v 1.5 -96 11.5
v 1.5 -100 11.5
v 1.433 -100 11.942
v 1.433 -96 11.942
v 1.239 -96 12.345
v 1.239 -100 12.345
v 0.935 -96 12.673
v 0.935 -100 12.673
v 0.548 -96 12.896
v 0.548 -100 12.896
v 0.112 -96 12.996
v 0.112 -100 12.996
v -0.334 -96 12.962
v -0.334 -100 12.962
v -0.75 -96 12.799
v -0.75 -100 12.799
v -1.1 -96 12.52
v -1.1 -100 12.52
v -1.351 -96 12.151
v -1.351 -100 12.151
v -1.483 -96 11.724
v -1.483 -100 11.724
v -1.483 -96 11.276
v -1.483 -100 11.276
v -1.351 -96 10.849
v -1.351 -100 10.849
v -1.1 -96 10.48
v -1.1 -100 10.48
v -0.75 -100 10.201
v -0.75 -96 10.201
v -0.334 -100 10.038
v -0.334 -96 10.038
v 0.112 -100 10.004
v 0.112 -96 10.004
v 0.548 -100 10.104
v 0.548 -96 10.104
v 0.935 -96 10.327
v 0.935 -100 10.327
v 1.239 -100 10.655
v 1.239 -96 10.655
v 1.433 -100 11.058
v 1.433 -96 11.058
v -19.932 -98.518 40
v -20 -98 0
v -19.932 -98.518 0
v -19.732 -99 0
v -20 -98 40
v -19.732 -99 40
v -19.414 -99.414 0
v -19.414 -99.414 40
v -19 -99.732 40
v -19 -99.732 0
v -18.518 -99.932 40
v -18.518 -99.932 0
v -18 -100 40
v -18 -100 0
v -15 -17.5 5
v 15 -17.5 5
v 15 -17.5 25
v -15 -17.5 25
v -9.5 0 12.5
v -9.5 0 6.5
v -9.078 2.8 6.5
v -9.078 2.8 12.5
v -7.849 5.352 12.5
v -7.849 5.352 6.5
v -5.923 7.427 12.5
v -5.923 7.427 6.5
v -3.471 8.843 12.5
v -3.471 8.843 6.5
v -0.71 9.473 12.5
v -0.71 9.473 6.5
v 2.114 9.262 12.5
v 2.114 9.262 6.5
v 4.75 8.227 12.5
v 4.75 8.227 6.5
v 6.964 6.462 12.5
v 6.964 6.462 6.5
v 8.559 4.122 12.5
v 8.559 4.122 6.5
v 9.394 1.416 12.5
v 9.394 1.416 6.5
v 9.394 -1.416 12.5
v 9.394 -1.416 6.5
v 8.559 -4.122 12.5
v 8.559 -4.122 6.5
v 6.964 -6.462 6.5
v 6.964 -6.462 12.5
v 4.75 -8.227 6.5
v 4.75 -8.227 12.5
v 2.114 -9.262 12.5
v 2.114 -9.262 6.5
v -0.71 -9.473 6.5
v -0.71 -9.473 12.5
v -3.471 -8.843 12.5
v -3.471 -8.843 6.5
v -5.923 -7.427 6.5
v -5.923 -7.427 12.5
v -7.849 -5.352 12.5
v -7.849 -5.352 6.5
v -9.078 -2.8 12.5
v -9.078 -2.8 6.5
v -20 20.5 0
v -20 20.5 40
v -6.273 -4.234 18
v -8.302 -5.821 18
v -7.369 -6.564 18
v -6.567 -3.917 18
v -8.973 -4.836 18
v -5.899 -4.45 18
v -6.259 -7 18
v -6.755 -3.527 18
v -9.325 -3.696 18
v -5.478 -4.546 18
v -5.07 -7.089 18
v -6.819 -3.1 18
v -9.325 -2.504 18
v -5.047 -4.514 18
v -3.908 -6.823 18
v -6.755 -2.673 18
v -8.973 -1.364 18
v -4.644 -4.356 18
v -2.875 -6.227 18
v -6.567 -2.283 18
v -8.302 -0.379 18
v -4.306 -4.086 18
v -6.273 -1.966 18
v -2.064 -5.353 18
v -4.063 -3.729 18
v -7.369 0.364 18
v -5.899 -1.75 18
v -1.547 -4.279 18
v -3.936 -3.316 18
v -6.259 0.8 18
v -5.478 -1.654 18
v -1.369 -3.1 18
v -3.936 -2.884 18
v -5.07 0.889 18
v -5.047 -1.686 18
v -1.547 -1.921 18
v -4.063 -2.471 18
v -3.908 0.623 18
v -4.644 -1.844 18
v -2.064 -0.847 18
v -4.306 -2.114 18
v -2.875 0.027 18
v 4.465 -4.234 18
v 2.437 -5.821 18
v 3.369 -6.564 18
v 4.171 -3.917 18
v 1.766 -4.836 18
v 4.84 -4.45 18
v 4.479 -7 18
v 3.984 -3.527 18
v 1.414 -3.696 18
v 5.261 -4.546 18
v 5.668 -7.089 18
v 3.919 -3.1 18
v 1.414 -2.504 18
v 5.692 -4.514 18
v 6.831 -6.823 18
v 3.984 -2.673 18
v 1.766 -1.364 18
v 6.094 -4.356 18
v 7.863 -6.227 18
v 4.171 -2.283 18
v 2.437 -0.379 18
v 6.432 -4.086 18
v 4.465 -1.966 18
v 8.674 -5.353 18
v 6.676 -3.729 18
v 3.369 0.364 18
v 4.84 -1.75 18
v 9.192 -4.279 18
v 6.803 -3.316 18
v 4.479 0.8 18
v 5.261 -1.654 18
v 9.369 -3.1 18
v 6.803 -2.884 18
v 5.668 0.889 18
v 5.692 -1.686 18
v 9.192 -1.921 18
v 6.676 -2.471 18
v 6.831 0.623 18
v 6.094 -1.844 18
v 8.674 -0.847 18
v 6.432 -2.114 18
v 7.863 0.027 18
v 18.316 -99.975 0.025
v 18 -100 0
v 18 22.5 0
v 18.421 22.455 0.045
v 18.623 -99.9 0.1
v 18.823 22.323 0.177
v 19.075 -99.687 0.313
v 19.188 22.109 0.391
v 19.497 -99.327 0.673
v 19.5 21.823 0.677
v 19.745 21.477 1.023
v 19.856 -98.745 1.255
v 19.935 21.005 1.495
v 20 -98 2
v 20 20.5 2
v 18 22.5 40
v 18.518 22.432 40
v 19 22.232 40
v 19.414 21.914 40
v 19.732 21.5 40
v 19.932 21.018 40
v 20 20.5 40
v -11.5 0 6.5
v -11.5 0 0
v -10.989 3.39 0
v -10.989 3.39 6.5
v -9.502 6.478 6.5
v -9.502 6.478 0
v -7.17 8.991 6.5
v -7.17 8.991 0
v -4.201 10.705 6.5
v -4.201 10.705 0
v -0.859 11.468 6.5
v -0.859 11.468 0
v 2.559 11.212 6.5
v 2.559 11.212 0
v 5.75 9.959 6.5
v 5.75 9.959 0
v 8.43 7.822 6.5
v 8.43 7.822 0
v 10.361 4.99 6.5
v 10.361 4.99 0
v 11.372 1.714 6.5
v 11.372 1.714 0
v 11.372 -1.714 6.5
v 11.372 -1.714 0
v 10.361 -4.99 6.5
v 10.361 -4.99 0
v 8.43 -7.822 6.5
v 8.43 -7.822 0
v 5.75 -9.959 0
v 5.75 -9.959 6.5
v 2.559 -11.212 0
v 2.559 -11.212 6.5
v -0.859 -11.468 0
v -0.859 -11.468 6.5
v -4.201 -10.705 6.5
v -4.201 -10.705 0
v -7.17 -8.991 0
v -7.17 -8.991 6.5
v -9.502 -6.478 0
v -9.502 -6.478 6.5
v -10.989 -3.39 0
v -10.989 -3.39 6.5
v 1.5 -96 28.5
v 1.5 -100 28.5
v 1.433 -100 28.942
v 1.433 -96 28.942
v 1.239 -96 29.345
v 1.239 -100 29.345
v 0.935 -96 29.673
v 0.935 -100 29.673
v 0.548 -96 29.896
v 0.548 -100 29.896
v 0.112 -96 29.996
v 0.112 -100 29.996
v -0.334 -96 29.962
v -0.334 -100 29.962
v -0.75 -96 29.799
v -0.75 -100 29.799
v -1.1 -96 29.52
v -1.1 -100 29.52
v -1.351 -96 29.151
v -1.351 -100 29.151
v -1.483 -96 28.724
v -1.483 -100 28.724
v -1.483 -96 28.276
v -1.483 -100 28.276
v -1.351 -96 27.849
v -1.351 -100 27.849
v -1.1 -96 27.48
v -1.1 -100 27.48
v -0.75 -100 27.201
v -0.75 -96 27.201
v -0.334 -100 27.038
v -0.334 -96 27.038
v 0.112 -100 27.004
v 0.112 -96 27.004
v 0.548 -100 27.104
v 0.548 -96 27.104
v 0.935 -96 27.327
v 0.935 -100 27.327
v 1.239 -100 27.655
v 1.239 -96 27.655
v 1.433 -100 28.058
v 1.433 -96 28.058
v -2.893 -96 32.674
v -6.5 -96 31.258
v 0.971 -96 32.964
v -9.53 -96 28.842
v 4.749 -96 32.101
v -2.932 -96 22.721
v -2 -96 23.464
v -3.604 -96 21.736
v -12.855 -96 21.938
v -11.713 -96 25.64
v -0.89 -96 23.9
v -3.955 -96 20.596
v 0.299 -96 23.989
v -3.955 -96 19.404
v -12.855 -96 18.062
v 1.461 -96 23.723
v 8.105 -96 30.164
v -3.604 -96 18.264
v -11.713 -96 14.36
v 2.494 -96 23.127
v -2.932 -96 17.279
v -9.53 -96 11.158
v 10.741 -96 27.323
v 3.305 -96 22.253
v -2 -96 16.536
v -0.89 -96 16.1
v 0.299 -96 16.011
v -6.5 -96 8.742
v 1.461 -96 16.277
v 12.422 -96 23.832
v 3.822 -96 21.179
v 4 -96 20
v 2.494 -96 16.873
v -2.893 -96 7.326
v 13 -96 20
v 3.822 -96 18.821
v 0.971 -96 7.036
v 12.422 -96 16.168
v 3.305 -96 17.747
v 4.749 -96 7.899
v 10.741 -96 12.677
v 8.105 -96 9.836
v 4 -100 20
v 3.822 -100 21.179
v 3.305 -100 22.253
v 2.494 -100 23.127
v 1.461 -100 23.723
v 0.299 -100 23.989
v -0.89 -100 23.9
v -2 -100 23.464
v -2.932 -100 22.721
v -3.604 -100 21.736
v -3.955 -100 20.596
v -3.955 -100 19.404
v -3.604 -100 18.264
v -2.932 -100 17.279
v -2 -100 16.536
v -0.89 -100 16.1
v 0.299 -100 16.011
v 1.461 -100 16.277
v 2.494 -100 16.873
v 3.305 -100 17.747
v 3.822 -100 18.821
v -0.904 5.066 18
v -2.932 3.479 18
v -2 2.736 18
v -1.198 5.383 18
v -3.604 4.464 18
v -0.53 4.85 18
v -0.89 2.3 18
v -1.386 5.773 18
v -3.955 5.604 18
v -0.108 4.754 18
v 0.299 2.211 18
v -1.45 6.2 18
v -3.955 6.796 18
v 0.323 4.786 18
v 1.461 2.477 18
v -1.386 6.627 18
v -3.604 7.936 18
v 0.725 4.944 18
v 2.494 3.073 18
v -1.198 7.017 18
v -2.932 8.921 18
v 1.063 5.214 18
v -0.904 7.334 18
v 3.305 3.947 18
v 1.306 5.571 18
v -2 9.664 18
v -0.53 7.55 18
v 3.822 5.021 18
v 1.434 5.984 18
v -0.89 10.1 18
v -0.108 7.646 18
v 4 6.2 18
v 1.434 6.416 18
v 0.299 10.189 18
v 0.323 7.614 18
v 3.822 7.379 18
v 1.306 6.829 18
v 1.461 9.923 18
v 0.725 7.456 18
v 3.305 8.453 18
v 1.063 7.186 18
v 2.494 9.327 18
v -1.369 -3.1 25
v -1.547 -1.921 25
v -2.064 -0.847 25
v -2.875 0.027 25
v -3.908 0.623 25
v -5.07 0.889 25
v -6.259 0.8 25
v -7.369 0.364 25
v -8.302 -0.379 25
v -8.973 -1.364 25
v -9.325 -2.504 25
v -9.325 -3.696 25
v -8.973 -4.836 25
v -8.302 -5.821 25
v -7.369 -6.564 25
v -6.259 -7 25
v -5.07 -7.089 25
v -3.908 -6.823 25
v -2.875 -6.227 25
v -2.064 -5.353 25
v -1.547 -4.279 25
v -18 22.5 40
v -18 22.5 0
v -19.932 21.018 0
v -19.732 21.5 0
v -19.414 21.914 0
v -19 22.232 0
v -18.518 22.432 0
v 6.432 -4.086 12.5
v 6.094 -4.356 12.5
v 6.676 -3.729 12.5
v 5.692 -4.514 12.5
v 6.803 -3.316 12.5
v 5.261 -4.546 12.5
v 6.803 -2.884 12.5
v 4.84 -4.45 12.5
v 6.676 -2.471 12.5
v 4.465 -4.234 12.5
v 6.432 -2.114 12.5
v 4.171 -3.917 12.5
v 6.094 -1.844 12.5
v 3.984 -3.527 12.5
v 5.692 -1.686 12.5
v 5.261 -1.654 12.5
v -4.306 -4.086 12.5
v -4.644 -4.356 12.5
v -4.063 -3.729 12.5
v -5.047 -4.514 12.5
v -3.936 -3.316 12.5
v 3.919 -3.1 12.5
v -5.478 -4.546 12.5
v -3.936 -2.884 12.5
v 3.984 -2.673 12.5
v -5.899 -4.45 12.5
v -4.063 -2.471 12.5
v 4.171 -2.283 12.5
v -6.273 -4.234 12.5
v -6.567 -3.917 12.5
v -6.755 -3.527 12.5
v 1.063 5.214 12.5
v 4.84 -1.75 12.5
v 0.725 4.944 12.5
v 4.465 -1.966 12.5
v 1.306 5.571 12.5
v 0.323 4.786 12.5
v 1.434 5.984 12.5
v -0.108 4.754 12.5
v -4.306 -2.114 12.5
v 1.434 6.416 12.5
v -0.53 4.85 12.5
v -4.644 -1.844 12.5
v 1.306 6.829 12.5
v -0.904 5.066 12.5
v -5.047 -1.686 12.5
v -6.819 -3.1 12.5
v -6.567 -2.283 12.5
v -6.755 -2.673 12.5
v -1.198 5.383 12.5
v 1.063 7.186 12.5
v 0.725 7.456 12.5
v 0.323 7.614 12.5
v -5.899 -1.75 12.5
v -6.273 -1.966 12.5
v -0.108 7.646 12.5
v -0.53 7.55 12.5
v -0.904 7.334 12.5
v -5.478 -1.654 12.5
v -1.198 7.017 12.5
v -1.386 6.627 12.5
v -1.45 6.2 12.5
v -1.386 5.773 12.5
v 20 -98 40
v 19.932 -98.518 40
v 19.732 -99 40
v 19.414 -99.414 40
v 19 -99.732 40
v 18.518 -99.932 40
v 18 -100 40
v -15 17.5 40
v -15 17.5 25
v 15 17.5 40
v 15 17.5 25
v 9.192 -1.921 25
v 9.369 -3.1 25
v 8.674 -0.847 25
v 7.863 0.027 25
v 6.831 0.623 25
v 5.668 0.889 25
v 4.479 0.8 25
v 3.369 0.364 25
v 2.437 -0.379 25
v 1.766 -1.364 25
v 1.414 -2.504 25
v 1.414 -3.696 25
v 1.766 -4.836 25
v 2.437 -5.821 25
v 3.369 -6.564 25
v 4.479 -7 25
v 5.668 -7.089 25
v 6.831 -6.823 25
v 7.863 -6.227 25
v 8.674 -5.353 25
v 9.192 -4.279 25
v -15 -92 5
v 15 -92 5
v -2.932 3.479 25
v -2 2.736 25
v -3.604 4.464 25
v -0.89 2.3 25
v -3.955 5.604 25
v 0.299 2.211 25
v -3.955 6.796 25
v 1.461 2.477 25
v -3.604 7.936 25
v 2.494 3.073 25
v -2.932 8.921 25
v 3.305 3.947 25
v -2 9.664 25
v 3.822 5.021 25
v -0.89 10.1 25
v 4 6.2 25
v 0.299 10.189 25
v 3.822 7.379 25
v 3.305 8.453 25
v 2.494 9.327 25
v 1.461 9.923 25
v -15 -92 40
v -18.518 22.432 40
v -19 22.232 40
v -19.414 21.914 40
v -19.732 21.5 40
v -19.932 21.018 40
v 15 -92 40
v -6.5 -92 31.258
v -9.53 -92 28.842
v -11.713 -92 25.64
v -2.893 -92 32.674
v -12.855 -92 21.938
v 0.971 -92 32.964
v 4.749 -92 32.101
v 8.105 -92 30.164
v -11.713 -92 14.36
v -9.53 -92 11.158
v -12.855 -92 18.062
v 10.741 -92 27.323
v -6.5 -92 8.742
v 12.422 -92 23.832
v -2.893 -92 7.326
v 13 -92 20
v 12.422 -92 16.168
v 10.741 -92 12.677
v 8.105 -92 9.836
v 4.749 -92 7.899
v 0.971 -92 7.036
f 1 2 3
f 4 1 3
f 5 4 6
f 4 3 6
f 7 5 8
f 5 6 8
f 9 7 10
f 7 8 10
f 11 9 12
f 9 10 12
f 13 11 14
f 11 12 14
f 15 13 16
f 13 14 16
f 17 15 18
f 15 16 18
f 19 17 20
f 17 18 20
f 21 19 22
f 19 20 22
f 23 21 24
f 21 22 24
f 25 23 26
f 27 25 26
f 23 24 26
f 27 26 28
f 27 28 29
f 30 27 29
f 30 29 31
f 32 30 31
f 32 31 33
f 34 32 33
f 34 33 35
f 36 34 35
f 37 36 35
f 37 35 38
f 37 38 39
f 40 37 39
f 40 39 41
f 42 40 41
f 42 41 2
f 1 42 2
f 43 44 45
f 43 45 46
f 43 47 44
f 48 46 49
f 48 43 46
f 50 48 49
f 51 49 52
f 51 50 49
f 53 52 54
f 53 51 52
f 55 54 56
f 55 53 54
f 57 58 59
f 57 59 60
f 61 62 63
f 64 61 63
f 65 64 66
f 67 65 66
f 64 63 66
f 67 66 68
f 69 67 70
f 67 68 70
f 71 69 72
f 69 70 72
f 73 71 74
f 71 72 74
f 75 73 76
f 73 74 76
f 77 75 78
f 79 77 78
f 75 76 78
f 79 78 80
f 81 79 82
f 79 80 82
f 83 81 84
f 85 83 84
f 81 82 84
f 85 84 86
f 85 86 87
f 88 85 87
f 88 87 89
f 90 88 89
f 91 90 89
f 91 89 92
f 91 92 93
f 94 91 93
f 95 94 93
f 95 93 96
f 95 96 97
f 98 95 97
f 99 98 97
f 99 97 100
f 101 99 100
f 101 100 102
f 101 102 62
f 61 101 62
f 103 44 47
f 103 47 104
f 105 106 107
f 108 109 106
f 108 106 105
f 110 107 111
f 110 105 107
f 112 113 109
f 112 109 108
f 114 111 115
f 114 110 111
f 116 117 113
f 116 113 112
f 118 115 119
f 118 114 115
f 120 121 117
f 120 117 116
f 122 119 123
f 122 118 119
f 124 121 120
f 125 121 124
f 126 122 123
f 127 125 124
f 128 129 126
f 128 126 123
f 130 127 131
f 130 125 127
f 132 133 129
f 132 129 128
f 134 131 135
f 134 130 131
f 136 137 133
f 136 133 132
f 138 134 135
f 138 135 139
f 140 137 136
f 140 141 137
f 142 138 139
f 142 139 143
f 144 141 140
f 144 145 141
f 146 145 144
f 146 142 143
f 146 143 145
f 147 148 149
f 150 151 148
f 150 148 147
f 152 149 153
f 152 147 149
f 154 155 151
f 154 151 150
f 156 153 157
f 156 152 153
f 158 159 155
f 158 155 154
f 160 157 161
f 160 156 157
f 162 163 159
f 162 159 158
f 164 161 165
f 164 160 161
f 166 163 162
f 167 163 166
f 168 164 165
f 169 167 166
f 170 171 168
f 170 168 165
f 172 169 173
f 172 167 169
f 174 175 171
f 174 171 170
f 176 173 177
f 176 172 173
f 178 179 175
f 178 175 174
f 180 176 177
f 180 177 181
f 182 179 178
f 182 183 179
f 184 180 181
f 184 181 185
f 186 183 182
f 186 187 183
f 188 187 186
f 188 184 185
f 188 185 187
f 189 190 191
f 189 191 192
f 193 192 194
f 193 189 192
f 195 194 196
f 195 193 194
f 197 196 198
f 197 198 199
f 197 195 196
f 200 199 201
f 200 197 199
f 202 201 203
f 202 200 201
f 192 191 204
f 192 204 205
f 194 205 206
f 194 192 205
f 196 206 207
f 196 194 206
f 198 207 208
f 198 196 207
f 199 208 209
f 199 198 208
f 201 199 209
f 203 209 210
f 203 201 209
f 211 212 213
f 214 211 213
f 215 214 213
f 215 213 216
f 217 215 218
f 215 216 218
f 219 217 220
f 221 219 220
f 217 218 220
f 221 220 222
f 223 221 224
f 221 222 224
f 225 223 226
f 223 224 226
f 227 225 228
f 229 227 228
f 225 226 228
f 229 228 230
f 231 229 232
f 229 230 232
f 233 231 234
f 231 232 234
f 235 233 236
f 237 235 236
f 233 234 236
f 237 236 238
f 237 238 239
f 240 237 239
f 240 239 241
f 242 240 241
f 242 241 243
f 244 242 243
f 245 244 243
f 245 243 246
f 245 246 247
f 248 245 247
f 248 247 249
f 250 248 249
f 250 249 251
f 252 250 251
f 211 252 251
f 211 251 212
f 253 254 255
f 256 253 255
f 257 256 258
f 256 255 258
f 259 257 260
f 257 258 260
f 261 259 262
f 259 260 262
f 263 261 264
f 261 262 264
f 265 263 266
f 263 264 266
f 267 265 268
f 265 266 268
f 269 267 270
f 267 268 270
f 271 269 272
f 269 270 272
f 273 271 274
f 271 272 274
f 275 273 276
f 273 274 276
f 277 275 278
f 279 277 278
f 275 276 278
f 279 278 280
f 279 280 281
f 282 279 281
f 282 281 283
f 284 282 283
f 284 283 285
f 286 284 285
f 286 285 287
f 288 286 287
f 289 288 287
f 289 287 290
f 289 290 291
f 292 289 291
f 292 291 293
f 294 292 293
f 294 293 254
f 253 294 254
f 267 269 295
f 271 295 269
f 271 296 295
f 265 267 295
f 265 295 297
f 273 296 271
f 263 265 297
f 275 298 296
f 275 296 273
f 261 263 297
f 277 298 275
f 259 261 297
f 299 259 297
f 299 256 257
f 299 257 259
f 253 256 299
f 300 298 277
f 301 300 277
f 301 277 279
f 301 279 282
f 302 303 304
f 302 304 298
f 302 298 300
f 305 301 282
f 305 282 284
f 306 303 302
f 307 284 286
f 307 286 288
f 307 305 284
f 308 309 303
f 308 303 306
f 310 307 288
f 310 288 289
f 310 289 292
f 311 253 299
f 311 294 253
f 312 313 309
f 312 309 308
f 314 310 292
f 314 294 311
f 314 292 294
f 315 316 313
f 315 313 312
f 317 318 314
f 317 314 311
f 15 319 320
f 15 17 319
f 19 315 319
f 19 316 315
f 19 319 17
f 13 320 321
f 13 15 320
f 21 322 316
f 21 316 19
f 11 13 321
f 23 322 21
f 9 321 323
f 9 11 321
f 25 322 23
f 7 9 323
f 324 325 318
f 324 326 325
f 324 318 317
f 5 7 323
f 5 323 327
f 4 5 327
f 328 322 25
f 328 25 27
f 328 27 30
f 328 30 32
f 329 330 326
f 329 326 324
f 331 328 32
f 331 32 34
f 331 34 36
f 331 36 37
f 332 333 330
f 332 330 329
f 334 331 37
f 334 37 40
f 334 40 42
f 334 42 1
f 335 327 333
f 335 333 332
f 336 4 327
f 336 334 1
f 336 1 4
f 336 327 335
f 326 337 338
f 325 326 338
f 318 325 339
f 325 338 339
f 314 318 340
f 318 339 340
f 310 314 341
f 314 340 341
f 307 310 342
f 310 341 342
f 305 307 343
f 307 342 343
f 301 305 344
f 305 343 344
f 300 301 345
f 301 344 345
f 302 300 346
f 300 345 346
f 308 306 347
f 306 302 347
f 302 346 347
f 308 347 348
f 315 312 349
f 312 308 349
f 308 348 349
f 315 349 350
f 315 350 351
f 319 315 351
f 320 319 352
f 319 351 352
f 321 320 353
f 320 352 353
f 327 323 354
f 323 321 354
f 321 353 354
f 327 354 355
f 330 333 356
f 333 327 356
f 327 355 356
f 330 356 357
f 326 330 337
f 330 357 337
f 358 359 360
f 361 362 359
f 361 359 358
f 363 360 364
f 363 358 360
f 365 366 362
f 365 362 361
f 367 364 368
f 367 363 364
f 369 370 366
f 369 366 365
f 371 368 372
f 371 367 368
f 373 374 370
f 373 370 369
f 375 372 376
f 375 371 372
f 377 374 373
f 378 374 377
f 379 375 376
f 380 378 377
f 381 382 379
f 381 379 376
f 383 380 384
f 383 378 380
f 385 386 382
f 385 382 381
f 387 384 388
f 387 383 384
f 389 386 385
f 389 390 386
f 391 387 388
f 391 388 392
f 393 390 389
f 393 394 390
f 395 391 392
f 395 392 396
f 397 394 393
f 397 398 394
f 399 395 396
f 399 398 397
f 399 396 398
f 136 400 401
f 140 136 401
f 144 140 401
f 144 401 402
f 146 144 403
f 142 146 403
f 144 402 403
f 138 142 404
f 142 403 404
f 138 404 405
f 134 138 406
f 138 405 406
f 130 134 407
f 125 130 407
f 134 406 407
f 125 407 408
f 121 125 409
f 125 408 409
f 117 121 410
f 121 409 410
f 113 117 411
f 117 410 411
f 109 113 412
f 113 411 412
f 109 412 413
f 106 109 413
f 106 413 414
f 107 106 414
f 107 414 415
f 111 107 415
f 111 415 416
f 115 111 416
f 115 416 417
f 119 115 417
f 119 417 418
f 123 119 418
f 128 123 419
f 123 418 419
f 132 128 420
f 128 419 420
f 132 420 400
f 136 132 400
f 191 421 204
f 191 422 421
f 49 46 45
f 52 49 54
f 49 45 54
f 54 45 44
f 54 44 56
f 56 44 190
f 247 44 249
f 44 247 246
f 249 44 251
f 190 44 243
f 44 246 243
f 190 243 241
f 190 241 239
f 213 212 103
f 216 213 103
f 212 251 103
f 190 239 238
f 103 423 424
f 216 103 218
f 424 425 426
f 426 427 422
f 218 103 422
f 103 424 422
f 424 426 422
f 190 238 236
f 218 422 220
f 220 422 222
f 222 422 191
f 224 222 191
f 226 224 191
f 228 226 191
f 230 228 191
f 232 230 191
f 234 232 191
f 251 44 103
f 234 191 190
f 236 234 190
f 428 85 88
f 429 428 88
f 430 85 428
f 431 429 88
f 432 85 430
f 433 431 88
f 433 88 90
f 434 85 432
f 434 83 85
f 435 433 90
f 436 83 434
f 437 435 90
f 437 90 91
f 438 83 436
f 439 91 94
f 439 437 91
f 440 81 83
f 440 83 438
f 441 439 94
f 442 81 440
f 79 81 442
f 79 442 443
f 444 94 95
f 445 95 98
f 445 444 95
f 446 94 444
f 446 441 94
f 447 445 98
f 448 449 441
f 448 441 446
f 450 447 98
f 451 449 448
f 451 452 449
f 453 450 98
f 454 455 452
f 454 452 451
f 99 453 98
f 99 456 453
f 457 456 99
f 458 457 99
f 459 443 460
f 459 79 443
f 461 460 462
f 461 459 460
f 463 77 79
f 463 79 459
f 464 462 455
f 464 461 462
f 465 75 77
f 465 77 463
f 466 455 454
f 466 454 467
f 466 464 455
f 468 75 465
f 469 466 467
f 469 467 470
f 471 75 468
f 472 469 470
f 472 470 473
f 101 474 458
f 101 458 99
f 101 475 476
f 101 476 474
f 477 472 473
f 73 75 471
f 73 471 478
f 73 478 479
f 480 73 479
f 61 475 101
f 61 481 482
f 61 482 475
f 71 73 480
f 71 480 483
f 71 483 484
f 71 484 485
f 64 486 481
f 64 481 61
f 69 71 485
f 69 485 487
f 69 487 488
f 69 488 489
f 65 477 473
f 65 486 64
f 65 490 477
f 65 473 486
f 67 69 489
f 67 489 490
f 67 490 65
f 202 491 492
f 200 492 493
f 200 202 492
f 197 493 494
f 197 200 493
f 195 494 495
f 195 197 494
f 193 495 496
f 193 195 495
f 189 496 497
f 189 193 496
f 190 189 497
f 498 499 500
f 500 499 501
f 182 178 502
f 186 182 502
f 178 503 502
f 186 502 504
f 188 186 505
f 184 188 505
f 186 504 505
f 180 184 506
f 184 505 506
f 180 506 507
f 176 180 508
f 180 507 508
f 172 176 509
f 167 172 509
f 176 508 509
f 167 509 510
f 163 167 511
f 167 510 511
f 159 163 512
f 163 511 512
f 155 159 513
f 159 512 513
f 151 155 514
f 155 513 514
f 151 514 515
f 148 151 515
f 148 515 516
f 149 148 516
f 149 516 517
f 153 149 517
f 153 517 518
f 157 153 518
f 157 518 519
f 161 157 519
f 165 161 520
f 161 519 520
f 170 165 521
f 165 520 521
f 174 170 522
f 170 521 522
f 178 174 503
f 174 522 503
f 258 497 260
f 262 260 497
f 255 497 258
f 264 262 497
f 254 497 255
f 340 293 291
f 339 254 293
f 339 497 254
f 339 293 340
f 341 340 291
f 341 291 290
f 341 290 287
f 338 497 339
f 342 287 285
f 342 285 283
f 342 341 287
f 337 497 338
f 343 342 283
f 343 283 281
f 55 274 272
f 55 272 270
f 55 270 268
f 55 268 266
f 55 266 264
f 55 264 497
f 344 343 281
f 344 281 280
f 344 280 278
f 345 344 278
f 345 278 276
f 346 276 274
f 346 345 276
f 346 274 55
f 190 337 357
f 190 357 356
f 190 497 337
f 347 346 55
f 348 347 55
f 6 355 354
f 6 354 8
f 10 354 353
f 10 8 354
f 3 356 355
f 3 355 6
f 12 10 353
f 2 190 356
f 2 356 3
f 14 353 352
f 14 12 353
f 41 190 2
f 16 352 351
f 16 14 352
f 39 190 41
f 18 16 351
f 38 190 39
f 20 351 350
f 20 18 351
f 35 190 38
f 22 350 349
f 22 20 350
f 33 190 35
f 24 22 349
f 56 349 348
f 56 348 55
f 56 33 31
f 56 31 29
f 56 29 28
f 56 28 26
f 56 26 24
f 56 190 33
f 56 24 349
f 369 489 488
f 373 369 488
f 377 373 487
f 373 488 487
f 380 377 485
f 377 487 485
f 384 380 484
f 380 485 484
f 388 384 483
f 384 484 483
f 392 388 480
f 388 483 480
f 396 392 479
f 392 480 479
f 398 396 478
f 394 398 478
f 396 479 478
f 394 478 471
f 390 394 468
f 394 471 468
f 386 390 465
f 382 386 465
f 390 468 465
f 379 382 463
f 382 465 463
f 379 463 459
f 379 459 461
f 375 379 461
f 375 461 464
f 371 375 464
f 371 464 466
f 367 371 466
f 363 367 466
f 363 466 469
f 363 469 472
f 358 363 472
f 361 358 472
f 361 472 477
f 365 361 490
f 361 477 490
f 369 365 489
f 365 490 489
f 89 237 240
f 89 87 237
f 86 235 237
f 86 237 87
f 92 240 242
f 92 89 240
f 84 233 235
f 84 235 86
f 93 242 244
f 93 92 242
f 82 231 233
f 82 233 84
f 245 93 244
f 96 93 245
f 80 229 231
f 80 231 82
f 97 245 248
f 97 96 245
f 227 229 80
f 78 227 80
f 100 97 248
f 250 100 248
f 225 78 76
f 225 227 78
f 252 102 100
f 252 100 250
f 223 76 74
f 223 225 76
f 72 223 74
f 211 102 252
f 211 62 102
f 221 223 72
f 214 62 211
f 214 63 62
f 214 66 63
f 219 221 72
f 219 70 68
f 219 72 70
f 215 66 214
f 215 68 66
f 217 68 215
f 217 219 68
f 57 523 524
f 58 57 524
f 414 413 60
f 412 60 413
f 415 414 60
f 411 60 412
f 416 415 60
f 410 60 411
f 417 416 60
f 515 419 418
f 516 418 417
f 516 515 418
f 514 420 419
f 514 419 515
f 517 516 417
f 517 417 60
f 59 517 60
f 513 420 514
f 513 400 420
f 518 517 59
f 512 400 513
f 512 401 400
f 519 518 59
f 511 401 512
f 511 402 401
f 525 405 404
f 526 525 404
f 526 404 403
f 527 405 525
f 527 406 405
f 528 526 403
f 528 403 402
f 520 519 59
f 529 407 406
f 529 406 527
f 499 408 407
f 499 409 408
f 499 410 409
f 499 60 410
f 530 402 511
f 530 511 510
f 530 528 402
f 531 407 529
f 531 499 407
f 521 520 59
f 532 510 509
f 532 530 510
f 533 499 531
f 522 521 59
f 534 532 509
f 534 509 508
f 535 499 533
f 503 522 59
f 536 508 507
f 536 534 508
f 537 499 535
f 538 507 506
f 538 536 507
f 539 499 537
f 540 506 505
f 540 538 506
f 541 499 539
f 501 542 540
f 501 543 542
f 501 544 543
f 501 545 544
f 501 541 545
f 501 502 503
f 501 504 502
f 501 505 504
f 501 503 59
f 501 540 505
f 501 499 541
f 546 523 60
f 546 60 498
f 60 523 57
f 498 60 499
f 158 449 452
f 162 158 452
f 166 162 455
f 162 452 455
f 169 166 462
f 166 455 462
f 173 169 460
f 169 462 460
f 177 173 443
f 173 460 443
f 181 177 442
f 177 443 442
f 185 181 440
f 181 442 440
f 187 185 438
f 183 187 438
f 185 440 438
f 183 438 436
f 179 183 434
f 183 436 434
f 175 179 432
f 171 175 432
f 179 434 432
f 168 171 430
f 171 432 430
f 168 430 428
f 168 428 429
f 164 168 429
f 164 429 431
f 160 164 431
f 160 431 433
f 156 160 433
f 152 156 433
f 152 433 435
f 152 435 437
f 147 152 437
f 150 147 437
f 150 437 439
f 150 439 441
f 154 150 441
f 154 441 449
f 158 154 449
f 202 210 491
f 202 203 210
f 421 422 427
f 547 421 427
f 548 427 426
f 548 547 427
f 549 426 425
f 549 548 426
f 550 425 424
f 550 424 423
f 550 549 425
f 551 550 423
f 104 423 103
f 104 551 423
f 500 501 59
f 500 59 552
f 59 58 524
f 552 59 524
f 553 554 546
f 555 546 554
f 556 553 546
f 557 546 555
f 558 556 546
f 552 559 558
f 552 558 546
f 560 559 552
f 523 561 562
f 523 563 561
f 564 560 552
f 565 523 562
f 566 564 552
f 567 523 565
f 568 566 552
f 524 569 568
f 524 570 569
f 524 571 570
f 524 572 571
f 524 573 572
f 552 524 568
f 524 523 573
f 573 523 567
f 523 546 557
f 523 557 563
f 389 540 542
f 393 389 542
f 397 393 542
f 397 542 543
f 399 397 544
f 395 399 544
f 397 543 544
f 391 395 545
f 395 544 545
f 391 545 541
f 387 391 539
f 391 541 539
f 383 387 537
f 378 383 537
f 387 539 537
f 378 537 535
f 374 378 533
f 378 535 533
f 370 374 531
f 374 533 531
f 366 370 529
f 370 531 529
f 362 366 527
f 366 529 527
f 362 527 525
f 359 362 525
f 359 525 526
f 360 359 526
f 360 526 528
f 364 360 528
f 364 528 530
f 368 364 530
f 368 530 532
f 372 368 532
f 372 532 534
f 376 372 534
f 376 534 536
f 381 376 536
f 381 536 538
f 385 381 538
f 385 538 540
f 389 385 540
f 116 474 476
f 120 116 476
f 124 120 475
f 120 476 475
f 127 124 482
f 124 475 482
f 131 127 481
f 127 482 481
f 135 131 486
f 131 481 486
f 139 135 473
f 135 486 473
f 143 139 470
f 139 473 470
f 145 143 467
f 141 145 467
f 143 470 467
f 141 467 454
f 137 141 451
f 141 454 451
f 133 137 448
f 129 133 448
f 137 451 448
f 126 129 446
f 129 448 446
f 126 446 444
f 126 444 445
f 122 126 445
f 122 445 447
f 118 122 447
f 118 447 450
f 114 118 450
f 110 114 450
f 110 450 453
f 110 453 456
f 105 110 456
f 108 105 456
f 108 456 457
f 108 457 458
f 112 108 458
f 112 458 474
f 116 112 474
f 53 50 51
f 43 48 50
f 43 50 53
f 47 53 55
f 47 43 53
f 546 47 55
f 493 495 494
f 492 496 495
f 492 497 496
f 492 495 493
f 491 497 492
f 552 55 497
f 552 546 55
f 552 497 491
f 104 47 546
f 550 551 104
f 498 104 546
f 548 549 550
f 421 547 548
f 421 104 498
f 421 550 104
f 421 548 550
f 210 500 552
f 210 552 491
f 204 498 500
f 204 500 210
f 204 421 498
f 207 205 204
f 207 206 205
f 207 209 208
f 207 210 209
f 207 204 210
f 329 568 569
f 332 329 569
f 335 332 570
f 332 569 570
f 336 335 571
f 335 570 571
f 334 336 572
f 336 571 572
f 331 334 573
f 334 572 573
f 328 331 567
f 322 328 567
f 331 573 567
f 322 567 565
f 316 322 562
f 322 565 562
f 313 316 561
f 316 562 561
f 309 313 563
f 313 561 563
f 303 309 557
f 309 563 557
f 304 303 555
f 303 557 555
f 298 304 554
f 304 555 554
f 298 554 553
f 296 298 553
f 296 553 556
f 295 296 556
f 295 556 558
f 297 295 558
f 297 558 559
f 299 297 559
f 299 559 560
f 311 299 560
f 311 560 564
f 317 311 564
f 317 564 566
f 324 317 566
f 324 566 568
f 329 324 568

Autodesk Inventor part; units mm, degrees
ref_plane "YZ Plane" through (0, 0, 0) normal (1, 0, 0) x (0, 1, 0)
ref_plane "XZ Plane" through (0, 0, 0) normal (0, 1, 0) x (-1, 0, 0)
ref_plane "XY Plane" through (0, 0, 0) normal (0, 0, 1) x (1, 0, 0)
sketch "Sketch1" plane through (0, 0, 0) normal (0, 0, 1) x (1, 0, 0)
  line L0 (-20, 22.5) -> (20, 22.5)
  line L1 (20, 22.5) -> (20, -100)
  line L2 (20, -100) -> (-20, -100)
  line L3 (-20, -100) -> (-20, 22.5)
  circle A0 centre (0, 0) radius 4
  dimension "d0" = 122.5
  dimension "d1" = 40
  dimension "d2" = 20
  dimension "d3" = 22.5
  dimension "d4" = 8
extrude "Extrusion1" add sketch "Sketch1" along normal blind 5
sketch "Sketch2" plane through (0, 0, 5) normal (0, 0, 1) x (1, 0, 0)
  line L0 (20, 22.5) -> (-20, 22.5) projected
  line L1 (-20, -100) -> (20, -100) projected
  line L2 (-20, 22.5) -> (20, 22.5)
  line L3 (20, 22.5) -> (20, -100)
  line L4 (20, -100) -> (-20, -100)
  line L5 (-20, -100) -> (-20, 22.5)
  line L6 (-15, 17.5) -> (15, 17.5)
  line L7 (15, 17.5) -> (15, -95)
  line L8 (15, -95) -> (-15, -95)
  line L9 (-15, -95) -> (-15, 17.5)
  point P0 (0, 0)
  dimension "d7" = 5
  dimension "d8" = 5
  dimension "d9" = 5
  dimension "d10" = 5
extrude "Extrusion2" add sketch "Sketch2" along normal blind 35
sketch "Sketch3" plane through (-20, -100, 0) normal (0, -1, 0) x (1, 0, 0)
  circle A0 centre (20, 20) radius 4
  line L0 (40, 0) -> (40, 40) projected
  line L1 (0, 0) -> (40, 0) projected
  circle A1 centre (20, 20) radius 8.5
  line L2 (9.176, 20) -> (31.9076, 20)
  circle A2 centre (11.5, 20) radius 1.5
  circle A3 centre (28.5, 20) radius 1.5
  line L3 (0, 40) -> (40, 40) projected
  line L4 (20, 9.4564) -> (20, 30.2603)
  circle A4 centre (20, 28.5) radius 1.5
  circle A5 centre (20, 11.5) radius 1.5
  point P0 (20, 0)
  dimension "d13" = 20
  dimension "d14" = 20
  dimension "d15" = 8
  dimension "d16" = 17
  dimension "d17" = 3
  dimension "d18" = 3
  dimension "d19" = 20
  dimension "d20" = 20
  dimension "d21" = 3
  dimension "d22" = 3
extrude "Extrusion3" cut sketch "Sketch3" against normal blind 10 contours L2 L4 A0 | A0 L4 L2 | L4 L2 A0 | A0 L2 L4 | A4 A1 L4 | L4 A1 A4 | A5 A1 L4 | L4 A1 A5 | L4 A4 A1 | A1 A4 L4 | L4 A5 A1 | A1 A5 L4
sketch "Sketch4" plane through (-15, -95, 5) normal (0, 1, 0) x (1, 0, 0)
  line L0 (0, 0) -> (30, 0)
  line L1 (30, 0) -> (30, -35)
  line L2 (30, -35) -> (0, -35)
  line L3 (0, -35) -> (0, 0)
  circle A0 centre (15, -15) radius 4 projected
  circle A1 centre (15, -15) radius 13
  circle A2 centre (15, -23.5) radius 1.5 projected
  circle A3 centre (15, -23.5) radius 1.5
  circle A4 centre (15, -6.5) radius 1.5 projected
  circle A5 centre (15, -6.5) radius 1.5
  point P0 (15, 5)
  dimension "d25" = 26
extrude "Extrusion4" add sketch "Sketch4" along normal blind 3 contours L0 L1 L2 L3 | A1
sketch "Sketch5" plane through (-15, -92, 5) normal (0, 1, 0) x (1, 0, 0)
  circle A0 centre (15, -15) radius 4 projected
  circle A1 centre (15, -15) radius 13
  point P0 (15, 5)
  dimension "d28" = 26
extrude "Extrusion5" cut sketch "Sketch5" against normal blind 4
fillet "Fillet1" radius 2 5 edges at (-20, 22.5, 20) (20, 22.5, 20) (20, -100, 20) (-20, -100, 20) (20, -38.75, 0)
sketch "Sketch6" plane through (0, 0, 5) normal (0, 0, 1) x (1, 0, 0)
  line L0 (-15, -92) -> (-15, 17.5) projected
  line L1 (15, 17.5) -> (15, -92) projected
  line L2 (-15, 17.5) -> (15, 17.5)
  line L3 (15, 17.5) -> (15, -17.5)
  line L4 (15, -17.5) -> (-15, -17.5)
  line L5 (-15, -17.5) -> (-15, 17.5)
  circle A0 centre (0, 0) radius 4
  point P0 (-15, -17.5)
  dimension "d32" = 35
extrude "Extrusion6" add sketch "Sketch6" along normal blind 20
sketch "Sketch7" plane through (0, 0, 0) normal (0, 0, -1) x (-1, 0, 0)
  circle A0 centre (0, 0) radius 9.5
  dimension "d35" = 19
extrude "Extrusion7" cut sketch "Sketch7" against normal blind 12.5
sketch "Sketch8" plane through (0, 0, 0) normal (0, 0, -1) x (-1, 0, 0)
  circle A0 centre (0, 0) radius 4 projected
  circle A1 centre (0, 0) radius 11.5
  dimension "d38" = 23
extrude "Extrusion8" cut sketch "Sketch8" against normal blind 6.5
sketch "Sketch9" plane through (0, 0, 25) normal (0, 0, 1) x (1, 0, 0)
  circle A0 centre (0, 0) radius 4
extrude "Extrusion9" add sketch "Sketch9" against normal blind 12.5
sketch "Sketch10" plane through (0, 0, 12.5) normal (0, 0, -1) x (-1, 0, 0)
  circle A0 centre (0, 0) radius 6.2
  line L0 (0, 6.2) -> (0, 0)
  line L1 (0, 0) -> (6.261, -3.6148)
  line L2 (0, 0) -> (-6.878, -3.971)
  circle A1 centre (0, 6.2) radius 1.45
  circle A2 centre (5.3694, -3.1) radius 1.45
  circle A3 centre (-5.3694, -3.1) radius 1.45
  dimension "d43" = 12.4
  dimension "d44" = 120
  dimension "d45" = 120
  dimension "d46" = 2.9
  dimension "d47" = 2.9
  dimension "d48" = 2.9
extrude "Extrusion10" cut sketch "Sketch10" against normal blind 12.5 contours A1 L0 A0 | A0 A1 | A2 A0 | A0 L1 A2 | L0 A1 A0 | A0 A2 L1 | A3 L2 A0 | A0 L2 A3 | A3 A0 L2 | A3 L2 A0
sketch "Sketch11" plane through (0, 0, 25) normal (0, 0, 1) x (1, 0, 0)
  circle A0 centre (5.3694, -3.1) radius 1.45 projected
  circle A1 centre (5.3694, -3.1) radius 4
  circle A2 centre (-5.3694, -3.1) radius 1.45 projected
  circle A3 centre (-5.3694, -3.1) radius 4
  circle A4 centre (0, 6.2) radius 1.45 projected
  circle A5 centre (0, 6.2) radius 4
  point P0 (0, 0)
  dimension "d51" = 8
  dimension "d52" = 8
  dimension "d53" = 8
extrude "Extrusion11" cut sketch "Sketch11" against normal blind 7
properties part number "Link5_v2"
